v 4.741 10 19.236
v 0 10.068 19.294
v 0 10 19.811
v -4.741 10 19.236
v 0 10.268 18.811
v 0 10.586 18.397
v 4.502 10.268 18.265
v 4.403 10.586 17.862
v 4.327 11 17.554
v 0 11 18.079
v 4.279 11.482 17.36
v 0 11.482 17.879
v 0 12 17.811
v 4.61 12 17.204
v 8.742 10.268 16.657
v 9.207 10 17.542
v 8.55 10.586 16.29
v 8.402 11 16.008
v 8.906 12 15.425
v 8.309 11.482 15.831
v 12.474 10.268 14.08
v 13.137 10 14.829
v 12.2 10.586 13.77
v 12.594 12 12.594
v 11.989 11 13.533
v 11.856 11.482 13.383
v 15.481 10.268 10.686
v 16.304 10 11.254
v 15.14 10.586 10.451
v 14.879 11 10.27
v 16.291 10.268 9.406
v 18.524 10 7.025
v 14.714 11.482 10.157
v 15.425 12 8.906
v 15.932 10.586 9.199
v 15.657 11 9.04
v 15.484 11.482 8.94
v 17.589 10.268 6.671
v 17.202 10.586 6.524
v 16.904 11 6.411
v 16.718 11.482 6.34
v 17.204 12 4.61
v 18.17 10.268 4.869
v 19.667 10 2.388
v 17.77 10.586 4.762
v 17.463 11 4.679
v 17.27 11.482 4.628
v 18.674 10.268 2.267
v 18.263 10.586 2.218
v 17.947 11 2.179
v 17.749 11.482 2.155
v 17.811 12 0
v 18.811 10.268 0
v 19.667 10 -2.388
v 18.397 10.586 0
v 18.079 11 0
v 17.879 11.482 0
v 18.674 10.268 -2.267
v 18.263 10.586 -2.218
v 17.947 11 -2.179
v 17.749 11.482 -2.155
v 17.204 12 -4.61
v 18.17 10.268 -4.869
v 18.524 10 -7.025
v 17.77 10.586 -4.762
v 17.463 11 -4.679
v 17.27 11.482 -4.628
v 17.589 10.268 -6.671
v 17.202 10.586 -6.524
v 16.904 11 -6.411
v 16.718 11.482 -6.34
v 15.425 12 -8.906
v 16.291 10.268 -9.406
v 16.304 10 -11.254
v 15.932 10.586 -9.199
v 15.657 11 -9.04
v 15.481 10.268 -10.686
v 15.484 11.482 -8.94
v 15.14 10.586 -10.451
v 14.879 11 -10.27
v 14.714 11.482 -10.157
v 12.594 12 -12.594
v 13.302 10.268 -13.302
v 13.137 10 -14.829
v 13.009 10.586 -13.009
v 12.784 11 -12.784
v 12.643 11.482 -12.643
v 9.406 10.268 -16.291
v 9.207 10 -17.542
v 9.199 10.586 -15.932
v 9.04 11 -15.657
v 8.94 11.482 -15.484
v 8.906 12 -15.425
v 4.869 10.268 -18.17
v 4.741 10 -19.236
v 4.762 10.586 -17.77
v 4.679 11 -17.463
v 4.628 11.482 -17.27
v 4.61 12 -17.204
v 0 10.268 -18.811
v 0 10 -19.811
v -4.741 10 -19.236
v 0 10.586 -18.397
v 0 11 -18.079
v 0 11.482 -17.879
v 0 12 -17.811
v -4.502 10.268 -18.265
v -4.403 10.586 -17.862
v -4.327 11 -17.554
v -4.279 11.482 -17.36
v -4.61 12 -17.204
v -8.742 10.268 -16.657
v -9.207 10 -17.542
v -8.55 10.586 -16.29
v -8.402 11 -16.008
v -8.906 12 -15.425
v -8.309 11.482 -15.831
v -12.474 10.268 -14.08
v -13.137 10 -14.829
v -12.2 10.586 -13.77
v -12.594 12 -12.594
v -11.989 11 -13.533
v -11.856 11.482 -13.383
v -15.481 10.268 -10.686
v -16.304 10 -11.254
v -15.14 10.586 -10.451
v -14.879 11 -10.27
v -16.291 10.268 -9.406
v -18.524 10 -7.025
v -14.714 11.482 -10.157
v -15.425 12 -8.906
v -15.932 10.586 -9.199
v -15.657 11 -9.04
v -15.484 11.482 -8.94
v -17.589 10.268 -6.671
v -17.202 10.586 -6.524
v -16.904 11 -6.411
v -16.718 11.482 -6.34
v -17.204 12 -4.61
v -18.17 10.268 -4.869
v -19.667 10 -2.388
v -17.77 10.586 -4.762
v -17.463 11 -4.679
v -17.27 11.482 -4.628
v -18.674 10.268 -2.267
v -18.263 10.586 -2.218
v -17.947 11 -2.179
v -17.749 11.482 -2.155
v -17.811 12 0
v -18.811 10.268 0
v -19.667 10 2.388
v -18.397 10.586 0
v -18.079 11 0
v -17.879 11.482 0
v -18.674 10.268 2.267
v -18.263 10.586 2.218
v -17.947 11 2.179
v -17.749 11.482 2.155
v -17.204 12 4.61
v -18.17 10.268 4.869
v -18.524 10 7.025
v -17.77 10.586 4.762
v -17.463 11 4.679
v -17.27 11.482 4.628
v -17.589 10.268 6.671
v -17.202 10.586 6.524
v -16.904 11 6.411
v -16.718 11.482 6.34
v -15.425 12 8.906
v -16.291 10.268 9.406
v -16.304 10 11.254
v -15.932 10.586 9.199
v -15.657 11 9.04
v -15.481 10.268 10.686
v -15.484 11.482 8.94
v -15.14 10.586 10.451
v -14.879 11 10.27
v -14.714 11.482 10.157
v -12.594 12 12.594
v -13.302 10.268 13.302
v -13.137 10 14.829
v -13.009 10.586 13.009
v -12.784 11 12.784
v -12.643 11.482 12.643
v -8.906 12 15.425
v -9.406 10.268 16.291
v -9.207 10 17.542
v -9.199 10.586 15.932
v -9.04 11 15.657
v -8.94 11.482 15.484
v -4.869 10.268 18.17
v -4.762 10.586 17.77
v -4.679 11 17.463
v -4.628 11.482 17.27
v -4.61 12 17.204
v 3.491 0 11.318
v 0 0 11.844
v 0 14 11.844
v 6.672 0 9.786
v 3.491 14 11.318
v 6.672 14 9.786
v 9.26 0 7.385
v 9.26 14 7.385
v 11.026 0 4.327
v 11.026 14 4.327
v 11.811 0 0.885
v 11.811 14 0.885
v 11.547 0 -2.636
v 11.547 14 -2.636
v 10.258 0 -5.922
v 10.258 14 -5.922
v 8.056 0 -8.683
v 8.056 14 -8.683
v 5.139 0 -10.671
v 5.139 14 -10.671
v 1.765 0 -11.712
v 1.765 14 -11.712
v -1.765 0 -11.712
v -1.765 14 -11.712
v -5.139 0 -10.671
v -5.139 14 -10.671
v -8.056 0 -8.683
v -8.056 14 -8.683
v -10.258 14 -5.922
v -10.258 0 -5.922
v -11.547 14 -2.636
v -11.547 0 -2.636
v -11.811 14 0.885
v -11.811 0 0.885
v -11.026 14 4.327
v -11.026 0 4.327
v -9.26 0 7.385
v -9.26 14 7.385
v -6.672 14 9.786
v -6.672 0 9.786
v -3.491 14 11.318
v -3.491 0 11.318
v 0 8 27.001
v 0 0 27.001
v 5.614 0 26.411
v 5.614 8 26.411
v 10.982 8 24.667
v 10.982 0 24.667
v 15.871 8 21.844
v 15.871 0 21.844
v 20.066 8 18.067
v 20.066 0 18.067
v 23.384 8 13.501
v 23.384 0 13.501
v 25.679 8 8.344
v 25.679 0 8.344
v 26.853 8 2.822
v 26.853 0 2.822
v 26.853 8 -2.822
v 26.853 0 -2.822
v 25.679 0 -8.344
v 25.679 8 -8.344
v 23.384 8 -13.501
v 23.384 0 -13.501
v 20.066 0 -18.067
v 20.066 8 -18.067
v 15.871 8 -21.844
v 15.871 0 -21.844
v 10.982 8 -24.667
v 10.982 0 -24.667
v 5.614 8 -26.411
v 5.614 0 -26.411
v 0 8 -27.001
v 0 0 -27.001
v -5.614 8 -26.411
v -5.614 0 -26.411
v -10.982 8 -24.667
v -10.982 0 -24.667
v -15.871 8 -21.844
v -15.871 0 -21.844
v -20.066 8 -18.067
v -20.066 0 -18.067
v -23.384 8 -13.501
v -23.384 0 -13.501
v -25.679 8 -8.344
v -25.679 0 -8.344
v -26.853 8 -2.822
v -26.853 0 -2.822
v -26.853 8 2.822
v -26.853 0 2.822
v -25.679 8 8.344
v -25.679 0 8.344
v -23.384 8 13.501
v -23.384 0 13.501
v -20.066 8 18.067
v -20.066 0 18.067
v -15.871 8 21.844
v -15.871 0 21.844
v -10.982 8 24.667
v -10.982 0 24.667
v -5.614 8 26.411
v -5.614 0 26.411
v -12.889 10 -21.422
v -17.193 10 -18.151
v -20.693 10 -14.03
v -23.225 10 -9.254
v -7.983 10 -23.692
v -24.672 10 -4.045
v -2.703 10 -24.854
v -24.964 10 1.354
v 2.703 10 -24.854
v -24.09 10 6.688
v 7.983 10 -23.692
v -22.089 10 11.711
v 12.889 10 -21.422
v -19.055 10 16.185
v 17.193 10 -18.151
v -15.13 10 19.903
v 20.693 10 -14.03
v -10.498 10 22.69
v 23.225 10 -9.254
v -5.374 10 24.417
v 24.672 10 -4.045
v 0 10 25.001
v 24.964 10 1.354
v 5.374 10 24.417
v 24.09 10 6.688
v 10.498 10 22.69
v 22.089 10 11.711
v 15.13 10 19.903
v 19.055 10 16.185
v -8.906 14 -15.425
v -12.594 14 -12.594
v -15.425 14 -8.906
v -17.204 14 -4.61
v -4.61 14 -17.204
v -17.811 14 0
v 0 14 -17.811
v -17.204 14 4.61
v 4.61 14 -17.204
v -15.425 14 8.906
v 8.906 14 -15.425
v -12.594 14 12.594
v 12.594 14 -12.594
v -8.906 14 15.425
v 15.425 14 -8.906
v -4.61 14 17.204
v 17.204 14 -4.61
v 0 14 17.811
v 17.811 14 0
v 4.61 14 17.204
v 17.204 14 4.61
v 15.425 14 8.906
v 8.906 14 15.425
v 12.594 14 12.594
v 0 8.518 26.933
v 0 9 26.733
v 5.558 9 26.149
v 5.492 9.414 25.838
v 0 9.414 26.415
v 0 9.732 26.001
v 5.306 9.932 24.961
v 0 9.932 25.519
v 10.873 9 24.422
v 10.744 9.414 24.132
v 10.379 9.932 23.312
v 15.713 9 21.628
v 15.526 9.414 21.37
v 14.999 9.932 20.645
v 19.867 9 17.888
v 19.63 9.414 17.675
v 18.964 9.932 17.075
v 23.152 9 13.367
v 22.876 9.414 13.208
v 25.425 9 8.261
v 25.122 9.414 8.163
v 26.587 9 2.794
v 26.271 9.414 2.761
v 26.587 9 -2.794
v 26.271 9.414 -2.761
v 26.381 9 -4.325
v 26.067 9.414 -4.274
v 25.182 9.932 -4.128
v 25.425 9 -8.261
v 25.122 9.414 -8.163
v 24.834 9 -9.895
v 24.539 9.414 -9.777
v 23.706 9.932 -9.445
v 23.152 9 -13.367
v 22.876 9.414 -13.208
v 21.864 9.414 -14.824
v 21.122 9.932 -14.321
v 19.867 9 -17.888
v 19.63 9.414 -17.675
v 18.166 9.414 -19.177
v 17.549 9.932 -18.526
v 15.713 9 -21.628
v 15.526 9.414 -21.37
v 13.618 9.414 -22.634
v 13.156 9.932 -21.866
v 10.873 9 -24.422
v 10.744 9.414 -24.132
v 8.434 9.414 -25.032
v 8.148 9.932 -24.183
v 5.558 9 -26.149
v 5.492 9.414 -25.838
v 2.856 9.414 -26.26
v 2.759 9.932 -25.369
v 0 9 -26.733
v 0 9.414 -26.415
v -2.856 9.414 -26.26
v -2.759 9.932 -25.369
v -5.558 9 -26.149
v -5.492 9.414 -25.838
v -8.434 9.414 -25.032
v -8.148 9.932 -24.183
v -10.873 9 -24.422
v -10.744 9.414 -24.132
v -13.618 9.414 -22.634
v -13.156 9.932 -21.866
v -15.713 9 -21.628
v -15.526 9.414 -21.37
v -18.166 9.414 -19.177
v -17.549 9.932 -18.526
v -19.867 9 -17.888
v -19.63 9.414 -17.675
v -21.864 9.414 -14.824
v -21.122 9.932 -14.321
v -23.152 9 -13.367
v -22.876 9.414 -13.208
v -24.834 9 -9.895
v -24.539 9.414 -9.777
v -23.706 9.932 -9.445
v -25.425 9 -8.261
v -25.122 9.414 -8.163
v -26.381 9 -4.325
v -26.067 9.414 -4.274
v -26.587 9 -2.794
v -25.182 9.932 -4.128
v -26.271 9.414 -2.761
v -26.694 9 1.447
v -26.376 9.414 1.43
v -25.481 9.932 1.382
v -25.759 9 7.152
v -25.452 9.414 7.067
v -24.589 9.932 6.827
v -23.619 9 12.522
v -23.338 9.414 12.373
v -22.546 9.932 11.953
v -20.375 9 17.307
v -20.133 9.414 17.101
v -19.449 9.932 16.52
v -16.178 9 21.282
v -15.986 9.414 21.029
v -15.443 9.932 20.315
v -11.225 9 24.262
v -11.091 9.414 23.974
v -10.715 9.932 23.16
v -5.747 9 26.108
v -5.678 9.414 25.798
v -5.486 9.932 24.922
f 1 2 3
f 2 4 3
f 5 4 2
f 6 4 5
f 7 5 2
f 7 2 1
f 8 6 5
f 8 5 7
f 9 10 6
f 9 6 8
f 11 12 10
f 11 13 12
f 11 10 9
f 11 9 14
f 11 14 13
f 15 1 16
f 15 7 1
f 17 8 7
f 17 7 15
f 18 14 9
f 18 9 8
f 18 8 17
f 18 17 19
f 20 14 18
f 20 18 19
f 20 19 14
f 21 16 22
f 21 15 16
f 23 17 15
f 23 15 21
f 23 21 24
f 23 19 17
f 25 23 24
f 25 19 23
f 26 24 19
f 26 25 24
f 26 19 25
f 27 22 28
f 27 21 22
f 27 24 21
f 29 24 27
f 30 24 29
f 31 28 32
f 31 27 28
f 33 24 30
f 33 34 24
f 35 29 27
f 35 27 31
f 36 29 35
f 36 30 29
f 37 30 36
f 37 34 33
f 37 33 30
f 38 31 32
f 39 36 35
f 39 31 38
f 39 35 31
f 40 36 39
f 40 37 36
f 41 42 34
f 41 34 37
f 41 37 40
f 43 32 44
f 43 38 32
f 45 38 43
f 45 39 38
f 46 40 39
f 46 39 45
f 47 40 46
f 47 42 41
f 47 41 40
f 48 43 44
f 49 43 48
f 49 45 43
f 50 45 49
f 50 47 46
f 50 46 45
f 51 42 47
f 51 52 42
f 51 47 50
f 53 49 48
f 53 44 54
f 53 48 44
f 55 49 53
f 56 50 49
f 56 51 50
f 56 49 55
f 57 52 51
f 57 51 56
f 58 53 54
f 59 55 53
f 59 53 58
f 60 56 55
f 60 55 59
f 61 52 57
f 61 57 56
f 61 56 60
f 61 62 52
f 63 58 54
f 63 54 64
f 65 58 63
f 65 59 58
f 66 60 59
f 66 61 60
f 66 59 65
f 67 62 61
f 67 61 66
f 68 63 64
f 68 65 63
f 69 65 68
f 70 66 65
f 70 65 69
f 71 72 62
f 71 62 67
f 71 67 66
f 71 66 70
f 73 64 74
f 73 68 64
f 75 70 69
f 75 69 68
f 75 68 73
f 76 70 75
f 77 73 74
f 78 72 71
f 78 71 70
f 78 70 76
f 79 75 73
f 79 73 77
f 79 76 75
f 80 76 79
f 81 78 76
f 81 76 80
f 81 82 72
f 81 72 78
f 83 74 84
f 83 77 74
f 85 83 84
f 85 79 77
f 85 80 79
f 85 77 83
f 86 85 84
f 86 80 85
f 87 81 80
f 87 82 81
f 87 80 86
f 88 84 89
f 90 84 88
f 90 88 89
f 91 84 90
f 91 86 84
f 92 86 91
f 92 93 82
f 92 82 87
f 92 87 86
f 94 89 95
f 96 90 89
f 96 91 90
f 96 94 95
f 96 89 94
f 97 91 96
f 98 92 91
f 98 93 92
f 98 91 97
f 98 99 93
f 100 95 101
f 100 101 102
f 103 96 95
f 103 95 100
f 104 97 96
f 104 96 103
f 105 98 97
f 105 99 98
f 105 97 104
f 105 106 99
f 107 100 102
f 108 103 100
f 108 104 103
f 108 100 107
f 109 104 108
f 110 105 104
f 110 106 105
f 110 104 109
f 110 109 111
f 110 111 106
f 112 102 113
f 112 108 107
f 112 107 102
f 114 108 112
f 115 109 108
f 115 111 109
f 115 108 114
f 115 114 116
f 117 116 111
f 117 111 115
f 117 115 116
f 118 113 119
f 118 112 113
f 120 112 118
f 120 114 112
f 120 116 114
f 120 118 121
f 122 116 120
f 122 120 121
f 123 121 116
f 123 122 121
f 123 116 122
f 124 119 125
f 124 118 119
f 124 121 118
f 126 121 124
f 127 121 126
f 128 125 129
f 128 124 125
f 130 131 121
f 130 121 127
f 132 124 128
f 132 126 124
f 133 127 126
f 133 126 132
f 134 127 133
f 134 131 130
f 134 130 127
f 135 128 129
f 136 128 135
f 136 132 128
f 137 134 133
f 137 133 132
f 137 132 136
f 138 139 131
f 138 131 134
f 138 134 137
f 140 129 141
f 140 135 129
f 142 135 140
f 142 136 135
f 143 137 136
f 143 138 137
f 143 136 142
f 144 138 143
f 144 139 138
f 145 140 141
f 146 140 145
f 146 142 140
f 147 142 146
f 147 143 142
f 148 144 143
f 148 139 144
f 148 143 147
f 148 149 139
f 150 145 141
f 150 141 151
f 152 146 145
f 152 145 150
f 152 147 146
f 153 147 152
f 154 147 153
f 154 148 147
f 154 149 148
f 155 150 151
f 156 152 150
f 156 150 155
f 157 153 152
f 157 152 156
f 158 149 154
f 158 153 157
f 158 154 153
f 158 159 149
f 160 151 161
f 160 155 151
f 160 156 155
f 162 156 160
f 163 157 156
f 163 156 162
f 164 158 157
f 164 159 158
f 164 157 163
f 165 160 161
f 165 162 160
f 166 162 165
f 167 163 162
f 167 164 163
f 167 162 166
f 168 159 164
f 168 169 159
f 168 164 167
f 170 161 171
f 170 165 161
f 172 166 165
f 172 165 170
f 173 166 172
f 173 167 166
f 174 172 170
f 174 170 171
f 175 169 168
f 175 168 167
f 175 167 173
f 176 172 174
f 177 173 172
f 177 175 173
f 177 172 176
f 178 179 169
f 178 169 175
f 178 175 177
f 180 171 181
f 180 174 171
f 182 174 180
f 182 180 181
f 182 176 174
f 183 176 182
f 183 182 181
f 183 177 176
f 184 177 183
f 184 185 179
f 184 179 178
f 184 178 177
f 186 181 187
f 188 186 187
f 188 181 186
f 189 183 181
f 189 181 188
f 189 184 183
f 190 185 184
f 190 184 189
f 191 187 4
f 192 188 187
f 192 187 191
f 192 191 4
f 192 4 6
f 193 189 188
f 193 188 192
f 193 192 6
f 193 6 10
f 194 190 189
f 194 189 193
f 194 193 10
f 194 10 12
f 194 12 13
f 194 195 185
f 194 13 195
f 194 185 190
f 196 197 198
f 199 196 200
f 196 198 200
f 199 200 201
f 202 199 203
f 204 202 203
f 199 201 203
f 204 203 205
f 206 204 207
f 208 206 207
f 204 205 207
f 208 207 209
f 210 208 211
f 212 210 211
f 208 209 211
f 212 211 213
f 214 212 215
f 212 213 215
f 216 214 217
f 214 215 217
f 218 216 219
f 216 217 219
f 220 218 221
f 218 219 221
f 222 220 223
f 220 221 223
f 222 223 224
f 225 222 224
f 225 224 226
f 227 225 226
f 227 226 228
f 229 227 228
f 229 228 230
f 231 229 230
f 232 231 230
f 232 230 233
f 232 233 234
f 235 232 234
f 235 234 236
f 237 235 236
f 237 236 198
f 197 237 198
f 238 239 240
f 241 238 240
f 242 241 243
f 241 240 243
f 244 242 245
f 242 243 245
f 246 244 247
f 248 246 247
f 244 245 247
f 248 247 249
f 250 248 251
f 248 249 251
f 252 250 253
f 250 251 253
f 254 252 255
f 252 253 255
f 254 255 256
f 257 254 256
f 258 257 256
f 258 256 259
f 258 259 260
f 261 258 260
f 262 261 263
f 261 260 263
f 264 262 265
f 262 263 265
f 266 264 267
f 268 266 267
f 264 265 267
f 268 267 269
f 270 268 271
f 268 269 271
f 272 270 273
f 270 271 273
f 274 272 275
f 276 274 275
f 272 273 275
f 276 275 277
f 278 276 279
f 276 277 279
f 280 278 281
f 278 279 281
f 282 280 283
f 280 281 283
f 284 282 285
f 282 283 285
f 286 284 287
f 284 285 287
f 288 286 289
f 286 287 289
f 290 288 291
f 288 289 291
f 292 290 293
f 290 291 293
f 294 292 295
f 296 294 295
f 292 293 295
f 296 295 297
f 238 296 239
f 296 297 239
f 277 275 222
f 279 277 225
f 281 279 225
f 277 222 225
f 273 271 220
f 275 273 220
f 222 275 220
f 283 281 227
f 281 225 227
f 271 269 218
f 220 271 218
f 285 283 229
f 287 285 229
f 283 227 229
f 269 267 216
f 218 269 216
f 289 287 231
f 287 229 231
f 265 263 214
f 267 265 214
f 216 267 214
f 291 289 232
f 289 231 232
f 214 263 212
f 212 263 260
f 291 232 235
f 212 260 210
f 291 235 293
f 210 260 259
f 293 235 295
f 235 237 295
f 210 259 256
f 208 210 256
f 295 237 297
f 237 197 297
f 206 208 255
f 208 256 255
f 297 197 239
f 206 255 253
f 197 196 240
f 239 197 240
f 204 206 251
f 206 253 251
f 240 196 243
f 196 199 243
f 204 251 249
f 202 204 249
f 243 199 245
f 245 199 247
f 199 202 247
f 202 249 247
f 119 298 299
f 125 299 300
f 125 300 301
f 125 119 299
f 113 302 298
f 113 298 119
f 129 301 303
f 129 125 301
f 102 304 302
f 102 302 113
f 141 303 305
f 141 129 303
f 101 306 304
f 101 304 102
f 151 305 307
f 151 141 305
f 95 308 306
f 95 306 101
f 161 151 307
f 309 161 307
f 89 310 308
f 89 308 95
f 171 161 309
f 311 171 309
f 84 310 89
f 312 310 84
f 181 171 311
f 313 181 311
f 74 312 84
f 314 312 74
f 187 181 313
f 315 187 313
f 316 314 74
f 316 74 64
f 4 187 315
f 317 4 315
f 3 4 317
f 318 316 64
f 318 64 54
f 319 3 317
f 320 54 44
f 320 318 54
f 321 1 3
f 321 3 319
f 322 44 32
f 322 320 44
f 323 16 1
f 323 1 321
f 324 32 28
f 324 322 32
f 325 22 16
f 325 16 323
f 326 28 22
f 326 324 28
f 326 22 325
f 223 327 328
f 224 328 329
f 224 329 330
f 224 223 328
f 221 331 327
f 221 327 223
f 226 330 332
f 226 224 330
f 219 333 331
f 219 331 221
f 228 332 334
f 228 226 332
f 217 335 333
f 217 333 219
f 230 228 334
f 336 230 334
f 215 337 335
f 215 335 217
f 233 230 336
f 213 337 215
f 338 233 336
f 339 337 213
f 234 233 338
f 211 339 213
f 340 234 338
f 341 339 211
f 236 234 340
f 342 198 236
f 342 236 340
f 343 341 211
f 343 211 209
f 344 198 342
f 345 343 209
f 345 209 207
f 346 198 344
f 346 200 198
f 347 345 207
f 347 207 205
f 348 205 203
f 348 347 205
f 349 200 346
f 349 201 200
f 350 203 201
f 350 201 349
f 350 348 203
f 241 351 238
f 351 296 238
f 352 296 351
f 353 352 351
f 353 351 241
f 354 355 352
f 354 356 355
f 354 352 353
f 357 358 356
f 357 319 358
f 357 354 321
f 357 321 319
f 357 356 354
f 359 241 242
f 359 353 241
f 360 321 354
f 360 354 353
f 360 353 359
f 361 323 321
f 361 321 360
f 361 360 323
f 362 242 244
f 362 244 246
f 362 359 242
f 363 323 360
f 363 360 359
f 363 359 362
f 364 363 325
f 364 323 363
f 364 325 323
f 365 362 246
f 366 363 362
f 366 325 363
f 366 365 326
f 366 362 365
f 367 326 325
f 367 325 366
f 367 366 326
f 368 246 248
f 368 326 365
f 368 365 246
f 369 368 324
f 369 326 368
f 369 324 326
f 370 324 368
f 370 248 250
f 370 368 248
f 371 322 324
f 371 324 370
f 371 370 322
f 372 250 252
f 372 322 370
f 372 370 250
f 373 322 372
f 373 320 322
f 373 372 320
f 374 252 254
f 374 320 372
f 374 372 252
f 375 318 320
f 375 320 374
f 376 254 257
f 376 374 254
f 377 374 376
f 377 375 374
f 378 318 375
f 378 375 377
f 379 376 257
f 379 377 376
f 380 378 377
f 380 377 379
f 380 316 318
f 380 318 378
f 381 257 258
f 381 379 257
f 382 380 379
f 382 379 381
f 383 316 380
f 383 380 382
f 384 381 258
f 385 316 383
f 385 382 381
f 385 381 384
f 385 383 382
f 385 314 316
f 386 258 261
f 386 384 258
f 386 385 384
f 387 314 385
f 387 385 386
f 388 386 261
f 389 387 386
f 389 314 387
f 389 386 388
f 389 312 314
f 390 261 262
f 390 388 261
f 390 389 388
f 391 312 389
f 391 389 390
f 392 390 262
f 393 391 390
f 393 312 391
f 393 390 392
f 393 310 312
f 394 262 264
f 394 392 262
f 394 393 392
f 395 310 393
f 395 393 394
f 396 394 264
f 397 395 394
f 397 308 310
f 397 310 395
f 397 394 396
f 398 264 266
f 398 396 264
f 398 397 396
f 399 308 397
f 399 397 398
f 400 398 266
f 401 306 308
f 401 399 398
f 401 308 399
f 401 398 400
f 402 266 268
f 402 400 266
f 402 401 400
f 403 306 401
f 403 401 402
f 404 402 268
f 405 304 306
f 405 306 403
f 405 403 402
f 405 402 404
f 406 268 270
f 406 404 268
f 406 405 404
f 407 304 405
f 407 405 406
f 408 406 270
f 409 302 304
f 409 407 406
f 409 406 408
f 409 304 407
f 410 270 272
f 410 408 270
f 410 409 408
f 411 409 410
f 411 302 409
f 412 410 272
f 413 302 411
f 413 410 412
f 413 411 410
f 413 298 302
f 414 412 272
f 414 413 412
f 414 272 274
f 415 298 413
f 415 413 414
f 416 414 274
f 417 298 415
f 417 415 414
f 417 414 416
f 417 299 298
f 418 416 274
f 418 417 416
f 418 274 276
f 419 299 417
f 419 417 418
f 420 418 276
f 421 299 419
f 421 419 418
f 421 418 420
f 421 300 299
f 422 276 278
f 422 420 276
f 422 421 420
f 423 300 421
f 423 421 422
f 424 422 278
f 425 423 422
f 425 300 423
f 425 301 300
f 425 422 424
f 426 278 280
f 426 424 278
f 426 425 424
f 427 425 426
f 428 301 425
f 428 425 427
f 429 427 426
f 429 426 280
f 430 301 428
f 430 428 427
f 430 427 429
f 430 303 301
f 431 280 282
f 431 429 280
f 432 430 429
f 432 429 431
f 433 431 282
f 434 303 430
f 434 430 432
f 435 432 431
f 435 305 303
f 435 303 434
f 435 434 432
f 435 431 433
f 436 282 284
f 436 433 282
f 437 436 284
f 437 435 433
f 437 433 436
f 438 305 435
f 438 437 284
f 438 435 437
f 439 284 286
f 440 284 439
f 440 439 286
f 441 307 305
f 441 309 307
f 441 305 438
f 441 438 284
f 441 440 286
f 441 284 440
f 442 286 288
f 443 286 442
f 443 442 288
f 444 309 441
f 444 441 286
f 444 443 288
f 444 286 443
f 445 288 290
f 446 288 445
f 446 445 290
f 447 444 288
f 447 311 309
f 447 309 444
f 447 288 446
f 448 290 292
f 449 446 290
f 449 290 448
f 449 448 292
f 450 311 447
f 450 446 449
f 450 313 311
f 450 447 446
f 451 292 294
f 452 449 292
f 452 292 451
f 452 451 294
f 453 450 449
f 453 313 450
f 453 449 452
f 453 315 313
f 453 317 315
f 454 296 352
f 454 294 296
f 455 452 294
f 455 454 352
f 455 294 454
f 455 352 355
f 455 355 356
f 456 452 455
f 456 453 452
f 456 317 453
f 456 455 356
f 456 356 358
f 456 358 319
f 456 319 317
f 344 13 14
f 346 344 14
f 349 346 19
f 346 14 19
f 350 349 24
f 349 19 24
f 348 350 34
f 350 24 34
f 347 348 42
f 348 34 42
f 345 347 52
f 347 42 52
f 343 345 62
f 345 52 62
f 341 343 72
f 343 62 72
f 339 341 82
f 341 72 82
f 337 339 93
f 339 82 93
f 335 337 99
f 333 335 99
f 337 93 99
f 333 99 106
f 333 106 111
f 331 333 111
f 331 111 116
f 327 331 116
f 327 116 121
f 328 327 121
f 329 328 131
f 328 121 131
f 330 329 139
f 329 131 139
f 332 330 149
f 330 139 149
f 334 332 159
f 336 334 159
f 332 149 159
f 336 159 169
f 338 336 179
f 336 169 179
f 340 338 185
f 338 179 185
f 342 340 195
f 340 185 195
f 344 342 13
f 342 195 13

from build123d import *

# Parameters (mm, degrees)
SKETCH1_R           = 27.001022249
BOSS_EXTRUDE1_DEPTH = 10
SKETCH2_R           = 17.811284506
BOSS_EXTRUDE3_DEPTH = 4
SKETCH3_R           = 11.844355023
CUT_EXTRUDE2_DEPTH  = 41.67075614
FILLET1_R           = 2


with BuildPart() as part:
    # Sketch1 → Boss-Extrude1 (new body)
    with BuildSketch(Plane(origin=(0, 0, 0), x_dir=(1, 0, 0), z_dir=(0, 1, 0))):
        with Locations(Location((0, 0, 0), (0, 0, 270))):
            Circle(SKETCH1_R)
    extrude(amount=BOSS_EXTRUDE1_DEPTH)

    # Sketch2 → Boss-Extrude3 (add)
    with BuildSketch(Plane(origin=(0, 10, 0), x_dir=(1, 0, 0), z_dir=(0, 1, 0))):
        with Locations(Location((0, 0, 0), (0, 0, 270))):
            Circle(SKETCH2_R)
    extrude(amount=BOSS_EXTRUDE3_DEPTH)

    # Sketch3 → Cut-Extrude2 (cut, through all)
    with BuildSketch(Plane(origin=(0, 14, 0), x_dir=(1, 0, 0), z_dir=(0, 1, 0))):
        with Locations(Location((0, 0, 0), (0, 0, 270))):
            Circle(SKETCH3_R)
    extrude(amount=-CUT_EXTRUDE2_DEPTH, mode=Mode.SUBTRACT)

    # Fillet1
    fillet1_edges = [part.edges().sort_by_distance(p)[0] for p in [
        (0, 10, -27.001022249),
        (0, 10, -17.811284506),
    ]]
    fillet(fillet1_edges, radius=FILLET1_R)


solid = part.part
